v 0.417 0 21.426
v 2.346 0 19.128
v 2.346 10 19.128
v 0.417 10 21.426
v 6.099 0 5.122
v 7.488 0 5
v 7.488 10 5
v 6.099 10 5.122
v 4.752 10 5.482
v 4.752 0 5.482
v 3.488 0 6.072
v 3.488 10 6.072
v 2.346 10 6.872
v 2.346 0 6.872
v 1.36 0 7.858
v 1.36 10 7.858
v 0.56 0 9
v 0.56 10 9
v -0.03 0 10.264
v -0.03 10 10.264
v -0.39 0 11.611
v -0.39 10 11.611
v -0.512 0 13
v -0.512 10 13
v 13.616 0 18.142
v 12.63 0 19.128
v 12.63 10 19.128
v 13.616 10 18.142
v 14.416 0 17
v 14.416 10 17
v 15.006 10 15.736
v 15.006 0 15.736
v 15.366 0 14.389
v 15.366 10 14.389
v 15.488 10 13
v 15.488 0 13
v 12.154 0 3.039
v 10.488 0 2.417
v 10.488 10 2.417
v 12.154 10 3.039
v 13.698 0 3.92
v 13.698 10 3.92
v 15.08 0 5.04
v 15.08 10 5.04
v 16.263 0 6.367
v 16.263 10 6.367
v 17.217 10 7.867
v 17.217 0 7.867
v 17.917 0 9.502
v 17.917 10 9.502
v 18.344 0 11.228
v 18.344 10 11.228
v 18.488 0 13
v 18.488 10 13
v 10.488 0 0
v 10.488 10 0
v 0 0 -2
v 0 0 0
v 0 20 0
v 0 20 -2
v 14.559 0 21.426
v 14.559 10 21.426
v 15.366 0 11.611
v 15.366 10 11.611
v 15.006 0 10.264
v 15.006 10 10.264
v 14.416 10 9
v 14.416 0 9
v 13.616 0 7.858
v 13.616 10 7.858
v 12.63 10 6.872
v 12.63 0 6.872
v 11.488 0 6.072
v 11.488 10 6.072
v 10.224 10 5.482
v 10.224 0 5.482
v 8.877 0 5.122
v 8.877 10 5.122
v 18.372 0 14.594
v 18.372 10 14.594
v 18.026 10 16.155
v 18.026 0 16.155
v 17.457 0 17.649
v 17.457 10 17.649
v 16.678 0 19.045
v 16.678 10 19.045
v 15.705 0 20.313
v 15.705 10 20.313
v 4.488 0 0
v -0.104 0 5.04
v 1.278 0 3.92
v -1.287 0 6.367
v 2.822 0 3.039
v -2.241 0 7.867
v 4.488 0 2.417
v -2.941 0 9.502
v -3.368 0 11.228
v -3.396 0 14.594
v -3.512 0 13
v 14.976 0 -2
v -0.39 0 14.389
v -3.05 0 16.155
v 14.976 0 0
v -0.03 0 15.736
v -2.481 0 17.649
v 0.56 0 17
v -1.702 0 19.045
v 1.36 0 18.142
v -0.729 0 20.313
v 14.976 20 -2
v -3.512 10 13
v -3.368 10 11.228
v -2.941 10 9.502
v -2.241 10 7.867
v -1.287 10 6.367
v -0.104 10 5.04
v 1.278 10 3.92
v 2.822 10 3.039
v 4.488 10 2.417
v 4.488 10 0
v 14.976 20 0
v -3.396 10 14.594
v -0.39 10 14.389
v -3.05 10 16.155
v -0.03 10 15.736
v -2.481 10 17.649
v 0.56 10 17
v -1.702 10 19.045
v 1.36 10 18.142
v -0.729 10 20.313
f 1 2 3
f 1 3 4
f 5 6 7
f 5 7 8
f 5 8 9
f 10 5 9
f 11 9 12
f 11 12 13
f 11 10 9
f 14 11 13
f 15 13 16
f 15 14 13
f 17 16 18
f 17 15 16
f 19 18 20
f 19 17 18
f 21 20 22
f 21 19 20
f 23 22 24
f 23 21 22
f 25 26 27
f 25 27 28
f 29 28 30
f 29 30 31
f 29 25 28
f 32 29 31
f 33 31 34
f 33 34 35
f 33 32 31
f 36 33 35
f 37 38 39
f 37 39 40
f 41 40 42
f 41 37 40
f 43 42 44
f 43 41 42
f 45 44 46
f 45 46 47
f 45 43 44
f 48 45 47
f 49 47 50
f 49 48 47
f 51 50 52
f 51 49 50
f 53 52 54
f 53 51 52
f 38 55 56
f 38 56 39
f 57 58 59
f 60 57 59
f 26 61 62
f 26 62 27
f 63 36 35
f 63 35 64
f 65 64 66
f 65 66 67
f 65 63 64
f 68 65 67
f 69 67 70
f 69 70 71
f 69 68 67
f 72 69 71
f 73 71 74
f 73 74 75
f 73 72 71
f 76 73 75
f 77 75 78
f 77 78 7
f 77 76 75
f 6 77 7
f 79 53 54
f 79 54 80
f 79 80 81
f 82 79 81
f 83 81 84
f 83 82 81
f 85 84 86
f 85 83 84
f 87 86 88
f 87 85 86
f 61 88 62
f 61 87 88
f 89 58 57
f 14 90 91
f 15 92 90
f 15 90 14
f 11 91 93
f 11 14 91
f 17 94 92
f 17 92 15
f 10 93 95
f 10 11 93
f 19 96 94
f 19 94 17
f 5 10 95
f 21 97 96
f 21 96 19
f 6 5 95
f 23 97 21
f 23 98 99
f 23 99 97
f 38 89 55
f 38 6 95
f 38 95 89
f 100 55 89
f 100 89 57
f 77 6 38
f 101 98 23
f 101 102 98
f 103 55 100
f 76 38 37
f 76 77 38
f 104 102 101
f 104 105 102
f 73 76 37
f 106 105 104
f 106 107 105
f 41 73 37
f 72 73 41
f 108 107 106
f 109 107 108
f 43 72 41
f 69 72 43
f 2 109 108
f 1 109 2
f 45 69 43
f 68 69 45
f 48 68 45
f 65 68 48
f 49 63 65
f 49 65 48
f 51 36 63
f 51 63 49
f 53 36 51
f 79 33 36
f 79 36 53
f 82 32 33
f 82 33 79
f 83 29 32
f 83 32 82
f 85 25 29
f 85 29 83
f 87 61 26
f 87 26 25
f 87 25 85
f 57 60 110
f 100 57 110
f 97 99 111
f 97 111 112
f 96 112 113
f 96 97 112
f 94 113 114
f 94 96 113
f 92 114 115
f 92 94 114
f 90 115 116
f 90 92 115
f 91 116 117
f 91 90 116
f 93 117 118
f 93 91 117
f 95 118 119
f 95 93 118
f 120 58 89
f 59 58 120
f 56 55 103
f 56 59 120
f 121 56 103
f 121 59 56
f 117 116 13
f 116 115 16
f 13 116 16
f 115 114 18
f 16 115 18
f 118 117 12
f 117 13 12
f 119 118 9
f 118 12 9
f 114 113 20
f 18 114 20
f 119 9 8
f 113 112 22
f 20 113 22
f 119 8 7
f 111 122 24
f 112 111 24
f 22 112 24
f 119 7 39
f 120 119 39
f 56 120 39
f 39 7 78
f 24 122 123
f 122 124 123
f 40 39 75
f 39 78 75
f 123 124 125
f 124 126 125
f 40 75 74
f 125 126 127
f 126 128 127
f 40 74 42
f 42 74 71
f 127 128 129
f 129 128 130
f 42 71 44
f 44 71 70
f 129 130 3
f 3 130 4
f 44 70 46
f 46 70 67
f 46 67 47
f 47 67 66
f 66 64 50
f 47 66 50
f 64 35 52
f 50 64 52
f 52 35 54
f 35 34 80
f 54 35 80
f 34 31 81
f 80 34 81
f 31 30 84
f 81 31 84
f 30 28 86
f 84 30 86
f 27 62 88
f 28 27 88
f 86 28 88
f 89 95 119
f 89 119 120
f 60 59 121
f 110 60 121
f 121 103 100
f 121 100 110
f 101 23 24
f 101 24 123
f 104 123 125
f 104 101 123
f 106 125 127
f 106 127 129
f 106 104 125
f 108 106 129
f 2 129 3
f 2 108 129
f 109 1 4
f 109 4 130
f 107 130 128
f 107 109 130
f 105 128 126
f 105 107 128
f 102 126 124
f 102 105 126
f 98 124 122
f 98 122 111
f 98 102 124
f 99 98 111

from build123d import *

# Parameters (mm, degrees)
F0_W     = 14.976
F0_H     = 20
F1_DEPTH = 2
F3_DEPTH = 10


with BuildPart() as f1:
    # F0 (on Top) → F1 (new body)
    with BuildSketch(Plane.XY):
        with Locations((7.488, 10)):
            Rectangle(F0_W, F0_H)
    extrude(amount=-F1_DEPTH)

    # F2 (on face) → F3 (join)
    with BuildSketch(Plane.XZ):
        with BuildLine():
            Line((7.488, 2), (7.488, 0))
            Line((7.488, 0), (10.488, 0))
            Line((10.488, 0), (10.488, 2.4169947557))
            ThreePointArc((10.488, 2.4169947557), (9.0024210632, 2.1047474172), (7.488, 2))
        make_face()
        with BuildLine():
            Line((4.488, 2.4169947557), (4.488, 0))
            Line((4.488, 0), (7.488, 0))
            Line((7.488, 0), (7.488, 2))
            ThreePointArc((7.488, 2), (5.9735789368, 2.1047474172), (4.488, 2.4169947557))
        make_face()
        with BuildLine():
            Line((4.488, 5), (4.488, 2.4169947557))
            ThreePointArc((4.488, 2.4169947557), (5.9735789368, 2.1047474172), (7.488, 2))
            Line((7.488, 2), (7.488, 5))
            Line((7.488, 5), (4.488, 5))
        make_face()
        with BuildLine():
            Line((7.488, 5), (7.488, 2))
            ThreePointArc((7.488, 2), (9.0024210632, 2.1047474172), (10.488, 2.4169947557))
            Line((10.488, 2.4169947557), (10.488, 5))
            Line((10.488, 5), (7.488, 5))
        make_face()
        with BuildLine():
            ThreePointArc((15.488, 13), (13.1448542495, 7.3431457505), (7.488, 5))
            Line((7.488, 5), (10.488, 5))
            Line((10.488, 5), (10.488, 2.4169947557))
            ThreePointArc((10.488, 2.4169947557), (16.2629643874, 6.3667504193), (18.488, 13))
            ThreePointArc((18.488, 13), (17.4573856574, 17.6488008791), (14.5586637066, 21.4264888743))
            Line((14.5586637066, 21.4264888743), (12.6303008775, 19.128355545))
            ThreePointArc((12.6303008775, 19.128355545), (14.7384622963, 16.3809460939), (15.488, 13))
        make_face()
        with BuildLine():
            ThreePointArc((-3.512, 13), (-1.2869643874, 6.3667504193), (4.488, 2.4169947557))
            Line((4.488, 2.4169947557), (4.488, 5))
            Line((4.488, 5), (7.488, 5))
            ThreePointArc((7.488, 5), (1.8311457505, 7.3431457505), (-0.512, 13))
            Line((-0.512, 13), (-3.512, 13))
        make_face()
        with BuildLine():
            ThreePointArc((0.4173362934, 21.4264888743), (-2.4813856574, 17.6488008791), (-3.512, 13))
            Line((-3.512, 13), (-0.512, 13))
            ThreePointArc((-0.512, 13), (0.2375377037, 16.3809460939), (2.3456991225, 19.128355545))
            Line((2.3456991225, 19.128355545), (0.4173362934, 21.4264888743))
        make_face()
    extrude(amount=-F3_DEPTH)


solid = f1.part
